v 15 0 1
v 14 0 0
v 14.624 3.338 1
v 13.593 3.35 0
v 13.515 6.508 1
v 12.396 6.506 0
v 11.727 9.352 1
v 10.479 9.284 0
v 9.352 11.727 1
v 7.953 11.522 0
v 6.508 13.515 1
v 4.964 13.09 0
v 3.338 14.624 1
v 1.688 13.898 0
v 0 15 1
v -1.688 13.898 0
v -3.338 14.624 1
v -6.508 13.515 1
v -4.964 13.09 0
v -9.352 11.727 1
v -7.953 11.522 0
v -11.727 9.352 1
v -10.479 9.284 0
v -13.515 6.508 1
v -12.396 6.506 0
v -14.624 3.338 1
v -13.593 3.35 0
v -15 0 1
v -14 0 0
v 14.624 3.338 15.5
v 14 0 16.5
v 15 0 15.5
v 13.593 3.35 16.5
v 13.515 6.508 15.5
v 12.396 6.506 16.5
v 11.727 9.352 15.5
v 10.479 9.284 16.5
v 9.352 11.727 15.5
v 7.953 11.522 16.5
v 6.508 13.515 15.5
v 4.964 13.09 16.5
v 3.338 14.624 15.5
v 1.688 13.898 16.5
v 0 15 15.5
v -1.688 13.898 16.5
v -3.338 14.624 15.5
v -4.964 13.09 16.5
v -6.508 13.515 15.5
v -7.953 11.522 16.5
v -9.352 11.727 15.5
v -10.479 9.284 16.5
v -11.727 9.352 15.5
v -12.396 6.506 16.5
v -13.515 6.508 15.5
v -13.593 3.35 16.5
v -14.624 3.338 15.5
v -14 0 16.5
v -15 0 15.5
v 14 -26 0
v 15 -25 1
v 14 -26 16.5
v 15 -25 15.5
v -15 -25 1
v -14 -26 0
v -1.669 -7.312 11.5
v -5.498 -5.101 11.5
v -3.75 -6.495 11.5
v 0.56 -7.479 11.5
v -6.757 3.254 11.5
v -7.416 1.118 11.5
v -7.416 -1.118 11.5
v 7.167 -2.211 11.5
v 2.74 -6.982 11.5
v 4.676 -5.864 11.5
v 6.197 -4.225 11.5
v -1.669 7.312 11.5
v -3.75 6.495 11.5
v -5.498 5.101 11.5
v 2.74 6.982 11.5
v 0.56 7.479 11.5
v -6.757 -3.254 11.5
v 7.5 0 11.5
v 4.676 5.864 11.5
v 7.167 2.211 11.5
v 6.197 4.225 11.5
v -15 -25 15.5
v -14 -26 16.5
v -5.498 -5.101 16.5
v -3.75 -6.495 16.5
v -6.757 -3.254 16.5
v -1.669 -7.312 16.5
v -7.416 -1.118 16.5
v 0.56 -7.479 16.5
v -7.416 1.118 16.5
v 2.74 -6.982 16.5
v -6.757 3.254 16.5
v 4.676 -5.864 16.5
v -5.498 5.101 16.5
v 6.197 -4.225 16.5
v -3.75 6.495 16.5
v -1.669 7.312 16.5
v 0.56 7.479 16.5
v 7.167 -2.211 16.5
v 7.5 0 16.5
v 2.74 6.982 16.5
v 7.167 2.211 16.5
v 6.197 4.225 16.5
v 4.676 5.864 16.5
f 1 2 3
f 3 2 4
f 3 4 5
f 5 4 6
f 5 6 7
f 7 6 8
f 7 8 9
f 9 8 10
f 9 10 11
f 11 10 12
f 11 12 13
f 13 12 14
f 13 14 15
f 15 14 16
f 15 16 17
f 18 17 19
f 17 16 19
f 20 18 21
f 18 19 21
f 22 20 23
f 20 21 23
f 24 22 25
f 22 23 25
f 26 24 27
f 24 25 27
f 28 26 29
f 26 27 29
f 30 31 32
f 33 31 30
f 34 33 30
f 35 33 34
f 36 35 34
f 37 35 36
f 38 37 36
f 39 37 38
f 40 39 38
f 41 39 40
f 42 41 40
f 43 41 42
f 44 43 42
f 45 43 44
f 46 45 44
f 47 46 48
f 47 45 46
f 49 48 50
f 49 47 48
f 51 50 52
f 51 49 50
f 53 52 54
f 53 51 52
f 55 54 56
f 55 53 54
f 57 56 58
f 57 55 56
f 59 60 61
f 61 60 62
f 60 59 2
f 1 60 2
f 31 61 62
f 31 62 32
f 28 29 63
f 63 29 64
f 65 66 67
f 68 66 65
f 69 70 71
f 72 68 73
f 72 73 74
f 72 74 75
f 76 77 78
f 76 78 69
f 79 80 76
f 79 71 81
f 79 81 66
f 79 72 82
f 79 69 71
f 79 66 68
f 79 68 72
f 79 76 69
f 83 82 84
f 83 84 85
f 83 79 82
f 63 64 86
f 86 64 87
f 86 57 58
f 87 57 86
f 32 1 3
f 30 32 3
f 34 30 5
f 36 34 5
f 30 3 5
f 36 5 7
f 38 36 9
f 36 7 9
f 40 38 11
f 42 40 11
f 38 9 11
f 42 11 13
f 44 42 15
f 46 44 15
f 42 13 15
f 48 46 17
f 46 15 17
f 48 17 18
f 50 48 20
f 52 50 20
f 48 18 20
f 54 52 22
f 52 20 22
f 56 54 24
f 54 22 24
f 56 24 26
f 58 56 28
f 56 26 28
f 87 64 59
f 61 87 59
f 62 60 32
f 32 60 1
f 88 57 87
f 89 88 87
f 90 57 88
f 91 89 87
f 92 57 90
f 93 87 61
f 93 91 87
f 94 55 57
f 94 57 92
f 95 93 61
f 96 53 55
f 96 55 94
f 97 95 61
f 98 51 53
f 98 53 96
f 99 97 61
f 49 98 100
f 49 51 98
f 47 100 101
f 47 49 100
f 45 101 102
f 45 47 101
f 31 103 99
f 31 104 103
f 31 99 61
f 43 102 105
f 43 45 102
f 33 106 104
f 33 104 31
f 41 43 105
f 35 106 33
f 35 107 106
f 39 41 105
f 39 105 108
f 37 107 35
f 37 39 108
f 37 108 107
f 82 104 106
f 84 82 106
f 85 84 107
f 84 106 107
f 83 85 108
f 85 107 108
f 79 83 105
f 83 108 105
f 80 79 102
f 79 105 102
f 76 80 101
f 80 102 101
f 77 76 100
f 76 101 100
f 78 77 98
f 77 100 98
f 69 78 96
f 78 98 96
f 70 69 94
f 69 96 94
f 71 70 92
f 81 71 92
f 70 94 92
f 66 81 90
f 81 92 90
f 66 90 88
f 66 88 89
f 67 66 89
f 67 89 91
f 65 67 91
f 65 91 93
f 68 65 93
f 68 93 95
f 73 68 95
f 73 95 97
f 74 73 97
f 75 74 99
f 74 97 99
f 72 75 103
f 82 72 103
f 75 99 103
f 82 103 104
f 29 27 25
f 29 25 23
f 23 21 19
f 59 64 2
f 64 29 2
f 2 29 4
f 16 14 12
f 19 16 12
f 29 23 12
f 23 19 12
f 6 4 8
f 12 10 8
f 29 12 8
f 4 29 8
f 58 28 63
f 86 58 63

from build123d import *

# Parameters (mm, degrees)
EXTRUDE_1_DEPTH     = 16.5
CHAMFER_1_SIZE      = 1
SKETCH_2_R          = 7.5
CUT_EXTRUDE_1_DEPTH = 5


with BuildPart() as part:
    # 草圖1 → 填料-伸長1 (new body)
    with BuildSketch(Plane.XY):
        with BuildLine():
            Line((-15, 0), (-15, -26))
            Line((-15, -26), (15, -26))
            Line((15, -26), (15, 0))
            ThreePointArc((15, 0), (0, 15), (-15, 0))
        make_face()
    extrude(amount=EXTRUDE_1_DEPTH)

    # 導角1
    chamfer_1_edges = [part.edges().sort_by_distance(p)[0] for p in [
        (15, -13, 16.5),
        (0, 15, 16.5),
        (15, -13, 0),
        (-15, -13, 0),
        (0, 15, 0),
        (-15, -13, 16.5),
        (15, -26, 8.25),
        (-15, -26, 8.25),
    ]]
    chamfer(chamfer_1_edges, length=CHAMFER_1_SIZE)

    # 草圖2 → 除料-伸長1 (cut)
    with BuildSketch(Plane.XY.offset(16.5)):
        Circle(SKETCH_2_R)
    extrude(amount=-CUT_EXTRUDE_1_DEPTH, mode=Mode.SUBTRACT)


solid = part.part
